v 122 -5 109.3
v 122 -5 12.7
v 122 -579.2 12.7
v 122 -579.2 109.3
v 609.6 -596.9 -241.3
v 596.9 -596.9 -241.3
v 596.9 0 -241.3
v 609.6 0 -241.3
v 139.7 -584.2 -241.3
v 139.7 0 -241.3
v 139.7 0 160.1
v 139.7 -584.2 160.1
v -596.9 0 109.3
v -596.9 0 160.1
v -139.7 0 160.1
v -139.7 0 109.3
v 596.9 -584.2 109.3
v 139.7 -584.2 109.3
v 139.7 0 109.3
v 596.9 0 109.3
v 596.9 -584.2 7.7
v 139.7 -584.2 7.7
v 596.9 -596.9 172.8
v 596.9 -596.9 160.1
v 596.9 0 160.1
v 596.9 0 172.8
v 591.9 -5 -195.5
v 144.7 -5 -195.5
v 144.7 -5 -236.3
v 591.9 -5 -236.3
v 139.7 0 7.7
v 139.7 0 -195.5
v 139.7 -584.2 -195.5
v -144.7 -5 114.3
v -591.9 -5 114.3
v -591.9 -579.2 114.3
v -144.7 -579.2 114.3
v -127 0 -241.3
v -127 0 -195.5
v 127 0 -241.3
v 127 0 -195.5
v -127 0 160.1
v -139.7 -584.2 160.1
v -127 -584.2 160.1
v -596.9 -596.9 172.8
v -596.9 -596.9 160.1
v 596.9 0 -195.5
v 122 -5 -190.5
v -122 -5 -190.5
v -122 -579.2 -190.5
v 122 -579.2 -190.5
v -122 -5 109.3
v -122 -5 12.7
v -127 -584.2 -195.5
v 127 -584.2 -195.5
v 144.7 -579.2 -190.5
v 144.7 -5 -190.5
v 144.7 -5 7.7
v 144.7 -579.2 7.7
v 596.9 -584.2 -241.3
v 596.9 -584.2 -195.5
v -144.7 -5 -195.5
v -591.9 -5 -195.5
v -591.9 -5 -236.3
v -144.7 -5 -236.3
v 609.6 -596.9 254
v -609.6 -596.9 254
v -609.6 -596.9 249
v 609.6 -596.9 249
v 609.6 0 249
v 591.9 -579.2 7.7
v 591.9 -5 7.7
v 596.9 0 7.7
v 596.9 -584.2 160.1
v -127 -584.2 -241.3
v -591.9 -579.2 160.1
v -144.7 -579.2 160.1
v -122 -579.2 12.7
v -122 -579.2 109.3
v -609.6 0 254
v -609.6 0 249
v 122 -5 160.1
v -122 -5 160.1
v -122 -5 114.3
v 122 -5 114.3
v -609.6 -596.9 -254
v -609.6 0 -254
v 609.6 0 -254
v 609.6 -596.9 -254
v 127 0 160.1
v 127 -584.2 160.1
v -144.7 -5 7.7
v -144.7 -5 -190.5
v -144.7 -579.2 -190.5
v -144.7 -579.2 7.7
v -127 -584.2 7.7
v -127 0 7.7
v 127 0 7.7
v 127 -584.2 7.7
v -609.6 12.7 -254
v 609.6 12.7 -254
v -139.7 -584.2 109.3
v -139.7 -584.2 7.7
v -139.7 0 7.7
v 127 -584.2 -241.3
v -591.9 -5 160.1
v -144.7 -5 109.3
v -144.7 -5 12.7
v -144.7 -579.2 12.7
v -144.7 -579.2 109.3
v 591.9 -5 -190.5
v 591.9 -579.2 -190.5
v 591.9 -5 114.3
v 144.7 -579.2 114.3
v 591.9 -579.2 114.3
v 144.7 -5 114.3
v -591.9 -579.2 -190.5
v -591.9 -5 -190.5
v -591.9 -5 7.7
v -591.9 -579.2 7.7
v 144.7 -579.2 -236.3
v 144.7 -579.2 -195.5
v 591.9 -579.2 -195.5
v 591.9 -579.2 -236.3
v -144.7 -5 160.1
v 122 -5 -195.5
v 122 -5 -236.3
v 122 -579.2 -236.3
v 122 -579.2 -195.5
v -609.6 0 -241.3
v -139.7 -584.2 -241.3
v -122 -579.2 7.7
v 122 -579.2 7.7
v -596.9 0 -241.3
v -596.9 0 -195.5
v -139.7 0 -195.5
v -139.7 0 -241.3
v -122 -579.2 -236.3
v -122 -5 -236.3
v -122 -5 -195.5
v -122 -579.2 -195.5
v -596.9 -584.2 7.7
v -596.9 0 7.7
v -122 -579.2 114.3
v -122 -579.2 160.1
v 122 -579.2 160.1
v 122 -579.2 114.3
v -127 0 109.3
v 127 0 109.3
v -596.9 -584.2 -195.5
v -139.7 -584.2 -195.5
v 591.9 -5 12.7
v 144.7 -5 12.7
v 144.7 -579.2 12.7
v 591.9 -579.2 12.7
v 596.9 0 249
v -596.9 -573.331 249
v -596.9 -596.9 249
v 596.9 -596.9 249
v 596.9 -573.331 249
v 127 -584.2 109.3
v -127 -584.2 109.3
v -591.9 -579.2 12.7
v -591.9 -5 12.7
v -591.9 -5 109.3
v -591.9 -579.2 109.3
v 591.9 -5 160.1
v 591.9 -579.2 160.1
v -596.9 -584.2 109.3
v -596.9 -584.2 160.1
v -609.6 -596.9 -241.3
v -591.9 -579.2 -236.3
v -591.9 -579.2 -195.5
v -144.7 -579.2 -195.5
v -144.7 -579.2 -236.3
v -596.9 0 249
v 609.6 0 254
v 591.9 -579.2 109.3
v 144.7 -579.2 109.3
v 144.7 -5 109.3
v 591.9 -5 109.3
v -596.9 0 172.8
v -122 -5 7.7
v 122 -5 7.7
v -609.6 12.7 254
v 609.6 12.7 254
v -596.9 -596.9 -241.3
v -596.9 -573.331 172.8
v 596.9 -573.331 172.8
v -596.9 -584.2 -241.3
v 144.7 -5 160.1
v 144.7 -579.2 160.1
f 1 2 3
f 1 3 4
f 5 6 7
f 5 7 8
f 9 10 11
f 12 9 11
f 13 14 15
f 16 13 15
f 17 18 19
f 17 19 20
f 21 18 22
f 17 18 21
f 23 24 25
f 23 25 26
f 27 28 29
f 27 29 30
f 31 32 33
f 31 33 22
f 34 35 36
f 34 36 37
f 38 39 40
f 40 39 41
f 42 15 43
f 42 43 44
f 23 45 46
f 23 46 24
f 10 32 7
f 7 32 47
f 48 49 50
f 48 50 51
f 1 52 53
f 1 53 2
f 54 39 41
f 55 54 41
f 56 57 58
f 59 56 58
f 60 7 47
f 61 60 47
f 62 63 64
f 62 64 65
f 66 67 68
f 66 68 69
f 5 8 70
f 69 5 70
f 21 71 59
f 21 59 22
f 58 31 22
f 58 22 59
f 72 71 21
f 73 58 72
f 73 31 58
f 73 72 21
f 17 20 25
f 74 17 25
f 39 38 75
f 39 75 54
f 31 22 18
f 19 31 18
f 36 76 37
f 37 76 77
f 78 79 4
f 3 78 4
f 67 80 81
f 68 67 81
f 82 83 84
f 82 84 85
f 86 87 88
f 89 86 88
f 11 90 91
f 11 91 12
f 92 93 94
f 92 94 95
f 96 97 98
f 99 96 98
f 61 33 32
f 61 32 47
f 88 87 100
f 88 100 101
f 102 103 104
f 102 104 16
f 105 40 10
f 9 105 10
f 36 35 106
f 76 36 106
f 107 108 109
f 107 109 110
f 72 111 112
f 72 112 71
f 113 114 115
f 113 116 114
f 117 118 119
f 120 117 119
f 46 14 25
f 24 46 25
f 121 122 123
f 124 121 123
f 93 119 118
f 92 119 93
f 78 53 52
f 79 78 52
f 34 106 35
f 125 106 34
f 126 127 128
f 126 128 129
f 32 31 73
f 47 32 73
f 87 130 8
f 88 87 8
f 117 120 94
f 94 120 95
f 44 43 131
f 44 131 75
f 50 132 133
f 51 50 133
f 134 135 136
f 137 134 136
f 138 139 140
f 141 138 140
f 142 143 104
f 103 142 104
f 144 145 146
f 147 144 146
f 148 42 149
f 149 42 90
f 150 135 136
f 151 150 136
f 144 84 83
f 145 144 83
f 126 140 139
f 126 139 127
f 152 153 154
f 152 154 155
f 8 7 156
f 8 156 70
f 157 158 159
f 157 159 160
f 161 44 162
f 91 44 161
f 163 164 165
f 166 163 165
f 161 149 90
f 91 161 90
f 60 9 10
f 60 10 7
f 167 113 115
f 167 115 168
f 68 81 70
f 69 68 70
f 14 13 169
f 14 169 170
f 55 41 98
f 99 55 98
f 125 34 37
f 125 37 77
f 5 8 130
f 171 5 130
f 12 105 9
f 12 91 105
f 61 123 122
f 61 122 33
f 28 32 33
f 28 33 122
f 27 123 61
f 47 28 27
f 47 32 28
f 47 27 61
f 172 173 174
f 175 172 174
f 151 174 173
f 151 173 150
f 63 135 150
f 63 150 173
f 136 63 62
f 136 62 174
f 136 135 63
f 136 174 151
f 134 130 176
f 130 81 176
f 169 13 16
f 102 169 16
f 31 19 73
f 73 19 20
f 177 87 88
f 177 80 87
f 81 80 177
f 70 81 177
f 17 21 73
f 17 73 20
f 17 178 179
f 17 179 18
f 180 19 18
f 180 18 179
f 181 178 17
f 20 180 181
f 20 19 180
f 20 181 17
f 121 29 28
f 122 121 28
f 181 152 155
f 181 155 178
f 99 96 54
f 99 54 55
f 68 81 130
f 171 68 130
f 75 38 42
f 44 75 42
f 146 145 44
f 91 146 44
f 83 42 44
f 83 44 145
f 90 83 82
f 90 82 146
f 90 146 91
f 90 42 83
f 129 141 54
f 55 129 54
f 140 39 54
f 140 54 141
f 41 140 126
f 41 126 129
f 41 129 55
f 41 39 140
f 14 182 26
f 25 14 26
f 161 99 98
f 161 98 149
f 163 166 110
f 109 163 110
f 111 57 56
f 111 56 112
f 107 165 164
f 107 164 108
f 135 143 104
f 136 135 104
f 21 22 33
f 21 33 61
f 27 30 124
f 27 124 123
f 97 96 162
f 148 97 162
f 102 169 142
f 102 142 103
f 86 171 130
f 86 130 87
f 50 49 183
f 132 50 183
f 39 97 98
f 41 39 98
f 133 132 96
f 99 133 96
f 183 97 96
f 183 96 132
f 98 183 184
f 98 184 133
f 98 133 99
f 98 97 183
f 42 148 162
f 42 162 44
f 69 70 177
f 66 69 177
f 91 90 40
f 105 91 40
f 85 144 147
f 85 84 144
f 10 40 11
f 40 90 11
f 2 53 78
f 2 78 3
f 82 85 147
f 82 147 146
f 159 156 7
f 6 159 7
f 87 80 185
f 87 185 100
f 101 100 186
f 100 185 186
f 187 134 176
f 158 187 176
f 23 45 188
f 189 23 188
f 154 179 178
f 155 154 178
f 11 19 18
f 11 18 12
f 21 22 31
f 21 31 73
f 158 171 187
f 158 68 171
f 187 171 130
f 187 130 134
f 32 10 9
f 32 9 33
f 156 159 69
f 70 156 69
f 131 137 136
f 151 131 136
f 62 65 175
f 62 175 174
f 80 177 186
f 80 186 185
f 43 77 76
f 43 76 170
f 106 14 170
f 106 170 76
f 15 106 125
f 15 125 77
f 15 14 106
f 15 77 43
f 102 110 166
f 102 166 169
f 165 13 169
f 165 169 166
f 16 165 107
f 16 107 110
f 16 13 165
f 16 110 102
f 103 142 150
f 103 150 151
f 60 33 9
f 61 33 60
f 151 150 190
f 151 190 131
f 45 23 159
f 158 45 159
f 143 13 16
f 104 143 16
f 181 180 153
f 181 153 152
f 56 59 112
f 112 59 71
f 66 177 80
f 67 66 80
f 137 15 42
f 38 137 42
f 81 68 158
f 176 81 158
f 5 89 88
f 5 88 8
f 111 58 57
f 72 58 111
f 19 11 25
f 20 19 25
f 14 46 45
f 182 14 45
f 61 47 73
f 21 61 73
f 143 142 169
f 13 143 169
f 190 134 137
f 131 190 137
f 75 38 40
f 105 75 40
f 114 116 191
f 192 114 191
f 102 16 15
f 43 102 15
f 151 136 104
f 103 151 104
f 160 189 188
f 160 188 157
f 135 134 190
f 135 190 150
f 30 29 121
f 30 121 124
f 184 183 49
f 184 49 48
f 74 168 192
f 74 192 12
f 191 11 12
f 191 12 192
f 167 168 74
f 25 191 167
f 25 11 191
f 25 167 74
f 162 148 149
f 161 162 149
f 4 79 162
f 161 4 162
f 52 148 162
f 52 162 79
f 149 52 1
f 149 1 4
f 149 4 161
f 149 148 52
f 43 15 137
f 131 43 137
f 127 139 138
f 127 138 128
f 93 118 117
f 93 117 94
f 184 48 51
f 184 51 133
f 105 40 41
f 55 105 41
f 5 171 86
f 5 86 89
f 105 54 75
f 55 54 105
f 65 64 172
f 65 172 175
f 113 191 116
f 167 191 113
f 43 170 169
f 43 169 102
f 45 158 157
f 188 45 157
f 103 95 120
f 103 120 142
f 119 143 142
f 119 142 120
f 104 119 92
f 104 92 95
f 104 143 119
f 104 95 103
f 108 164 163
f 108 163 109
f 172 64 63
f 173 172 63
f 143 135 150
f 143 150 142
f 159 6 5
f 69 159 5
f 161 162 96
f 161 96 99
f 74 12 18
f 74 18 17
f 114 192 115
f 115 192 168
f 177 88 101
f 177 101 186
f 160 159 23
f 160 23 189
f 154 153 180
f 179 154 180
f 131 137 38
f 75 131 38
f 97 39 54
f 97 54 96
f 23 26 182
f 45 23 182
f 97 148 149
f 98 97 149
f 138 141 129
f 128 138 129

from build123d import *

# Parameters (mm, degrees)
F5_W      = 12.7
F5_H      = 5
F5_W_2    = 254
F6_DEPTH  = 596.9
F5_H_2    = 45.8
F5_H_3    = 101.6
F5_H_4    = 50.8
F5_H_5    = 76.2
F5_H_6    = 203.2
F5_H_7    = 12.7
F7_DEPTH  = 596.9
F8_DEPTH  = 596.9
F9_DEPTH  = 584.2
F10_DEPTH = 584.2
F11_DEPTH = 596.9
F5_W_3    = 457.2
F12_DEPTH = 12.7
F13_DEPTH = 596.9
F14_W     = 23.5690682663
F14_H     = 76.2
F15_DEPTH = 1193.8
F16_DEPTH = 584.2
F17_T     = -5
F17_2_T   = -5
F17_3_T   = -5
F17_4_T   = -5
F17_5_T   = -5
F17_6_T   = -5
F18_DEPTH = 584.2
F19_T     = -5
F19_2_T   = -5
F19_3_T   = -5
F19_4_T   = -5
F19_5_T   = -5
F19_6_T   = -5


with BuildPart() as f6:
    # F5 (on Front) → F6 (new body)
    with BuildSketch(Plane.XZ):
        Polygon((-139.7, 249), (-139.7, 254), (-609.6, 254), (-609.6, 249), (-596.9, 249), align=None)
        with Locations((-133.35, 251.5)):
            Rectangle(F5_W, F5_H)
        with Locations((0, 251.5)):
            Rectangle(F5_W_2, F5_H)
        with Locations((133.35, 251.5)):
            Rectangle(F5_W, F5_H)
        Polygon((609.6, 249), (609.6, 254), (139.7, 254), (139.7, 249), (596.9, 249), align=None)
    extrude(amount=F6_DEPTH)


with BuildPart() as f7:
    # F5 (on Front) → F7 (new body)
    with BuildSketch(Plane.XZ):
        with Locations((-603.25, -218.4)):
            Rectangle(F5_W, F5_H_2)
        with Locations((-603.25, 58.5)):
            Rectangle(F5_W, F5_H_3)
        with Locations((-603.25, 134.7)):
            Rectangle(F5_W, F5_H_4)
        with Locations((-603.25, 210.9)):
            Rectangle(F5_W, F5_H_5)
        with Locations((-603.25, -93.9)):
            Rectangle(F5_W, F5_H_6)
        with Locations((-603.25, 166.45)):
            Rectangle(F5_W, F5_H_7)
    extrude(amount=F7_DEPTH)


with BuildPart() as f8:
    # F5 (on Front) → F8 (new body)
    with BuildSketch(Plane.XZ):
        with Locations((603.25, 134.7)):
            Rectangle(F5_W, F5_H_4)
        with Locations((603.25, 58.5)):
            Rectangle(F5_W, F5_H_3)
        with Locations((603.25, 210.9)):
            Rectangle(F5_W, F5_H_5)
        Polygon((609.6, -241.3), (609.6, 7.7), (596.9, 7.7), (596.9, -195.5), (596.9, -241.3), align=None)
        with Locations((603.25, 166.45)):
            Rectangle(F5_W, F5_H_7)
    extrude(amount=F8_DEPTH)


with BuildPart() as f9:
    # F5 (on Front) → F9 (new body)
    with BuildSketch(Plane.XZ):
        with Locations((-133.35, 134.7)):
            Rectangle(F5_W, F5_H_4)
        with Locations((-133.35, 58.5)):
            Rectangle(F5_W, F5_H_3)
        with Locations((-133.35, -93.9)):
            Rectangle(F5_W, F5_H_6)
        with Locations((-133.35, -218.4)):
            Rectangle(F5_W, F5_H_2)
    extrude(amount=F9_DEPTH)


with BuildPart() as f10:
    # F5 (on Front) → F10 (new body)
    with BuildSketch(Plane.XZ):
        with Locations((133.35, -218.4)):
            Rectangle(F5_W, F5_H_2)
        with Locations((133.35, -93.9)):
            Rectangle(F5_W, F5_H_6)
        with Locations((133.35, 58.5)):
            Rectangle(F5_W, F5_H_3)
        with Locations((133.35, 134.7)):
            Rectangle(F5_W, F5_H_4)
    extrude(amount=F10_DEPTH)


with BuildPart() as f11:
    # F5 (on Front) → F11 (new body)
    with BuildSketch(Plane.XZ):
        Polygon((-139.7, -254), (-139.7, -241.3), (-596.9, -241.3), (-609.6, -241.3), (-609.6, -254), align=None)
        with Locations((-133.35, -247.65)):
            Rectangle(F5_W, F5_H_7)
        with Locations((0, -247.65)):
            Rectangle(F5_W_2, F5_H_7)
        with Locations((133.35, -247.65)):
            Rectangle(F5_W, F5_H_7)
        Polygon((609.6, -254), (609.6, -241.3), (596.9, -241.3), (139.7, -241.3), (139.7, -254), align=None)
    extrude(amount=F11_DEPTH)


with BuildPart() as f12:
    # F5 (on Front) → F12 (new body)
    with BuildSketch(Plane.XZ):
        with Locations((0, 166.45)):
            Rectangle(F5_W_2, F5_H_7)
        with Locations((0, -218.4)):
            Rectangle(F5_W_2, F5_H_2)
        with Locations((368.3, 134.7)):
            Rectangle(F5_W_3, F5_H_4)
        with Locations((-368.3, 58.5)):
            Rectangle(F5_W_3, F5_H_3)
        with Locations((368.3, -218.4)):
            Rectangle(F5_W_3, F5_H_2)
        with Locations((368.3, 58.5)):
            Rectangle(F5_W_3, F5_H_3)
        with Locations((133.35, 134.7)):
            Rectangle(F5_W, F5_H_4)
        with Locations((-368.3, -218.4)):
            Rectangle(F5_W_3, F5_H_2)
        with Locations((0, -93.9)):
            Rectangle(F5_W_2, F5_H_6)
        with Locations((-368.3, 166.45)):
            Rectangle(F5_W_3, F5_H_7)
        with Locations((-133.35, -93.9)):
            Rectangle(F5_W, F5_H_6)
        with Locations((-133.35, 58.5)):
            Rectangle(F5_W, F5_H_3)
        with Locations((133.35, -218.4)):
            Rectangle(F5_W, F5_H_2)
        with Locations((0, 134.7)):
            Rectangle(F5_W_2, F5_H_4)
        with Locations((-368.3, -93.9)):
            Rectangle(F5_W_3, F5_H_6)
        with Locations((368.3, -93.9)):
            Rectangle(F5_W_3, F5_H_6)
        with Locations((0, 58.5)):
            Rectangle(F5_W_2, F5_H_3)
        with Locations((-368.3, 134.7)):
            Rectangle(F5_W_3, F5_H_4)
        with Locations((133.35, -93.9)):
            Rectangle(F5_W, F5_H_6)
        with Locations((368.3, 166.45)):
            Rectangle(F5_W_3, F5_H_7)
        with Locations((133.35, 58.5)):
            Rectangle(F5_W, F5_H_3)
        with Locations((-133.35, 134.7)):
            Rectangle(F5_W, F5_H_4)
        with Locations((-133.35, -218.4)):
            Rectangle(F5_W, F5_H_2)
        with Locations((-603.25, 58.5)):
            Rectangle(F5_W, F5_H_3)
        Polygon((609.6, -254), (609.6, -241.3), (596.9, -241.3), (139.7, -241.3), (139.7, -254), align=None)
        with Locations((-603.25, 134.7)):
            Rectangle(F5_W, F5_H_4)
        with Locations((-133.35, -247.65)):
            Rectangle(F5_W, F5_H_7)
        with Locations((603.25, 58.5)):
            Rectangle(F5_W, F5_H_3)
        Polygon((-139.7, -254), (-139.7, -241.3), (-596.9, -241.3), (-609.6, -241.3), (-609.6, -254), align=None)
        with Locations((603.25, 210.9)):
            Rectangle(F5_W, F5_H_5)
        with Locations((133.35, -247.65)):
            Rectangle(F5_W, F5_H_7)
        with Locations((0, -247.65)):
            Rectangle(F5_W_2, F5_H_7)
        with Locations((-603.25, 210.9)):
            Rectangle(F5_W, F5_H_5)
        Polygon((609.6, 249), (609.6, 254), (139.7, 254), (139.7, 249), (596.9, 249), align=None)
        Polygon((-139.7, 249), (-139.7, 254), (-609.6, 254), (-609.6, 249), (-596.9, 249), align=None)
        with Locations((-603.25, -93.9)):
            Rectangle(F5_W, F5_H_6)
        Polygon((609.6, -241.3), (609.6, 7.7), (596.9, 7.7), (596.9, -195.5), (596.9, -241.3), align=None)
        with Locations((-603.25, -218.4)):
            Rectangle(F5_W, F5_H_2)
        with Locations((133.35, 251.5)):
            Rectangle(F5_W, F5_H)
        with Locations((-133.35, 166.45)):
            Rectangle(F5_W, F5_H_7)
        with Locations((0, 251.5)):
            Rectangle(F5_W_2, F5_H)
        with Locations((-133.35, 251.5)):
            Rectangle(F5_W, F5_H)
        with Locations((133.35, 210.9)):
            Rectangle(F5_W, F5_H_5)
        with Locations((603.25, 134.7)):
            Rectangle(F5_W, F5_H_4)
        with Locations((603.25, 166.45)):
            Rectangle(F5_W, F5_H_7)
        with Locations((368.3, 210.9)):
            Rectangle(F5_W_3, F5_H_5)
        with Locations((-368.3, 210.9)):
            Rectangle(F5_W_3, F5_H_5)
        with Locations((0, 210.9)):
            Rectangle(F5_W_2, F5_H_5)
        with Locations((-603.25, 166.45)):
            Rectangle(F5_W, F5_H_7)
        with Locations((-133.35, 210.9)):
            Rectangle(F5_W, F5_H_5)
        with Locations((133.35, 166.45)):
            Rectangle(F5_W, F5_H_7)
    extrude(amount=-F12_DEPTH)


with BuildPart() as f13:
    # F5 (on Front) → F13 (new body)
    with BuildSketch(Plane.XZ):
        with Locations((368.3, 166.45)):
            Rectangle(F5_W_3, F5_H_7)
        with Locations((133.35, 166.45)):
            Rectangle(F5_W, F5_H_7)
        with Locations((0, 166.45)):
            Rectangle(F5_W_2, F5_H_7)
        with Locations((-133.35, 166.45)):
            Rectangle(F5_W, F5_H_7)
        with Locations((-368.3, 166.45)):
            Rectangle(F5_W_3, F5_H_7)
    extrude(amount=F13_DEPTH)


with BuildPart() as f15:
    # F14 (on face) → F15 (new body)
    with BuildSketch(Plane.YZ.offset(-596.9)):
        with Locations((-585.1154658668, 210.9)):
            Rectangle(F14_W, F14_H)
    extrude(amount=F15_DEPTH)


with BuildPart() as f16:
    # F5 (on Front) → F16 (new body)
    with BuildSketch(Plane.XZ):
        with Locations((-368.3, 134.7)):
            Rectangle(F5_W_3, F5_H_4)
    extrude(amount=F16_DEPTH)

    # F17
    f17_openings = [f16.faces().sort_by_distance(p)[0] for p in [
        (-368.3, -292.1, 160.1),
    ]]
    offset(amount=F17_T, openings=f17_openings)


with BuildPart() as f16b:
    # F5 (on Front) → F16, piece 2 (new body)
    with BuildSketch(Plane.XZ):
        with Locations((-368.3, -93.9)):
            Rectangle(F5_W_3, F5_H_6)
    extrude(amount=F16_DEPTH)

    # F17#4
    f17_4_openings = [f16b.faces().sort_by_distance(p)[0] for p in [
        (-368.3, -292.1, 7.7),
    ]]
    offset(amount=F17_4_T, openings=f17_4_openings)


with BuildPart() as f16c:
    # F5 (on Front) → F16, piece 3 (new body)
    with BuildSketch(Plane.XZ):
        with Locations((0, 134.7)):
            Rectangle(F5_W_2, F5_H_4)
    extrude(amount=F16_DEPTH)

    # F17#2
    f17_2_openings = [f16c.faces().sort_by_distance(p)[0] for p in [
        (0, -292.1, 160.1),
    ]]
    offset(amount=F17_2_T, openings=f17_2_openings)


with BuildPart() as f16d:
    # F5 (on Front) → F16, piece 4 (new body)
    with BuildSketch(Plane.XZ):
        with Locations((0, -93.9)):
            Rectangle(F5_W_2, F5_H_6)
    extrude(amount=F16_DEPTH)

    # F17#5
    f17_5_openings = [f16d.faces().sort_by_distance(p)[0] for p in [
        (0, -292.1, 7.7),
    ]]
    offset(amount=F17_5_T, openings=f17_5_openings)


with BuildPart() as f16e:
    # F5 (on Front) → F16, piece 5 (new body)
    with BuildSketch(Plane.XZ):
        with Locations((368.3, 134.7)):
            Rectangle(F5_W_3, F5_H_4)
    extrude(amount=F16_DEPTH)

    # F17#3
    f17_3_openings = [f16e.faces().sort_by_distance(p)[0] for p in [
        (368.3, -292.1, 160.1),
    ]]
    offset(amount=F17_3_T, openings=f17_3_openings)


with BuildPart() as f16f:
    # F5 (on Front) → F16, piece 6 (new body)
    with BuildSketch(Plane.XZ):
        with Locations((368.3, -93.9)):
            Rectangle(F5_W_3, F5_H_6)
    extrude(amount=F16_DEPTH)

    # F17#6
    f17_6_openings = [f16f.faces().sort_by_distance(p)[0] for p in [
        (368.3, -292.1, 7.7),
    ]]
    offset(amount=F17_6_T, openings=f17_6_openings)


with BuildPart() as f18:
    # F5 (on Front) → F18 (new body)
    with BuildSketch(Plane.XZ):
        with Locations((368.3, 58.5)):
            Rectangle(F5_W_3, F5_H_3)
    extrude(amount=F18_DEPTH)

    # F19#3
    f19_3_openings = [f18.faces().sort_by_distance(p)[0] for p in [
        (368.3, -292.1, 109.3),
    ]]
    offset(amount=F19_3_T, openings=f19_3_openings)


with BuildPart() as f18b:
    # F5 (on Front) → F18, piece 2 (new body)
    with BuildSketch(Plane.XZ):
        with Locations((0, 58.5)):
            Rectangle(F5_W_2, F5_H_3)
    extrude(amount=F18_DEPTH)

    # F19#2
    f19_2_openings = [f18b.faces().sort_by_distance(p)[0] for p in [
        (0, -292.1, 109.3),
    ]]
    offset(amount=F19_2_T, openings=f19_2_openings)


with BuildPart() as f18c:
    # F5 (on Front) → F18, piece 3 (new body)
    with BuildSketch(Plane.XZ):
        with Locations((-368.3, 58.5)):
            Rectangle(F5_W_3, F5_H_3)
    extrude(amount=F18_DEPTH)

    # F19
    f19_openings = [f18c.faces().sort_by_distance(p)[0] for p in [
        (-368.3, -292.1, 109.3),
    ]]
    offset(amount=F19_T, openings=f19_openings)


with BuildPart() as f18d:
    # F5 (on Front) → F18, piece 4 (new body)
    with BuildSketch(Plane.XZ):
        with Locations((-368.3, -218.4)):
            Rectangle(F5_W_3, F5_H_2)
    extrude(amount=F18_DEPTH)

    # F19#4
    f19_4_openings = [f18d.faces().sort_by_distance(p)[0] for p in [
        (-368.3, -292.1, -195.5),
    ]]
    offset(amount=F19_4_T, openings=f19_4_openings)


with BuildPart() as f18e:
    # F5 (on Front) → F18, piece 5 (new body)
    with BuildSketch(Plane.XZ):
        with Locations((0, -218.4)):
            Rectangle(F5_W_2, F5_H_2)
    extrude(amount=F18_DEPTH)

    # F19#5
    f19_5_openings = [f18e.faces().sort_by_distance(p)[0] for p in [
        (0, -292.1, -195.5),
    ]]
    offset(amount=F19_5_T, openings=f19_5_openings)


with BuildPart() as f18f:
    # F5 (on Front) → F18, piece 6 (new body)
    with BuildSketch(Plane.XZ):
        with Locations((368.3, -218.4)):
            Rectangle(F5_W_3, F5_H_2)
    extrude(amount=F18_DEPTH)

    # F19#6
    f19_6_openings = [f18f.faces().sort_by_distance(p)[0] for p in [
        (368.3, -292.1, -195.5),
    ]]
    offset(amount=F19_6_T, openings=f19_6_openings)


solid = Compound([f6.part, f7.part, f8.part, f9.part, f10.part, f11.part, f12.part, f13.part, f15.part, f16.part, f16b.part, f16c.part, f16d.part, f16e.part, f16f.part, f18.part, f18b.part, f18c.part, f18d.part, f18e.part, f18f.part])
